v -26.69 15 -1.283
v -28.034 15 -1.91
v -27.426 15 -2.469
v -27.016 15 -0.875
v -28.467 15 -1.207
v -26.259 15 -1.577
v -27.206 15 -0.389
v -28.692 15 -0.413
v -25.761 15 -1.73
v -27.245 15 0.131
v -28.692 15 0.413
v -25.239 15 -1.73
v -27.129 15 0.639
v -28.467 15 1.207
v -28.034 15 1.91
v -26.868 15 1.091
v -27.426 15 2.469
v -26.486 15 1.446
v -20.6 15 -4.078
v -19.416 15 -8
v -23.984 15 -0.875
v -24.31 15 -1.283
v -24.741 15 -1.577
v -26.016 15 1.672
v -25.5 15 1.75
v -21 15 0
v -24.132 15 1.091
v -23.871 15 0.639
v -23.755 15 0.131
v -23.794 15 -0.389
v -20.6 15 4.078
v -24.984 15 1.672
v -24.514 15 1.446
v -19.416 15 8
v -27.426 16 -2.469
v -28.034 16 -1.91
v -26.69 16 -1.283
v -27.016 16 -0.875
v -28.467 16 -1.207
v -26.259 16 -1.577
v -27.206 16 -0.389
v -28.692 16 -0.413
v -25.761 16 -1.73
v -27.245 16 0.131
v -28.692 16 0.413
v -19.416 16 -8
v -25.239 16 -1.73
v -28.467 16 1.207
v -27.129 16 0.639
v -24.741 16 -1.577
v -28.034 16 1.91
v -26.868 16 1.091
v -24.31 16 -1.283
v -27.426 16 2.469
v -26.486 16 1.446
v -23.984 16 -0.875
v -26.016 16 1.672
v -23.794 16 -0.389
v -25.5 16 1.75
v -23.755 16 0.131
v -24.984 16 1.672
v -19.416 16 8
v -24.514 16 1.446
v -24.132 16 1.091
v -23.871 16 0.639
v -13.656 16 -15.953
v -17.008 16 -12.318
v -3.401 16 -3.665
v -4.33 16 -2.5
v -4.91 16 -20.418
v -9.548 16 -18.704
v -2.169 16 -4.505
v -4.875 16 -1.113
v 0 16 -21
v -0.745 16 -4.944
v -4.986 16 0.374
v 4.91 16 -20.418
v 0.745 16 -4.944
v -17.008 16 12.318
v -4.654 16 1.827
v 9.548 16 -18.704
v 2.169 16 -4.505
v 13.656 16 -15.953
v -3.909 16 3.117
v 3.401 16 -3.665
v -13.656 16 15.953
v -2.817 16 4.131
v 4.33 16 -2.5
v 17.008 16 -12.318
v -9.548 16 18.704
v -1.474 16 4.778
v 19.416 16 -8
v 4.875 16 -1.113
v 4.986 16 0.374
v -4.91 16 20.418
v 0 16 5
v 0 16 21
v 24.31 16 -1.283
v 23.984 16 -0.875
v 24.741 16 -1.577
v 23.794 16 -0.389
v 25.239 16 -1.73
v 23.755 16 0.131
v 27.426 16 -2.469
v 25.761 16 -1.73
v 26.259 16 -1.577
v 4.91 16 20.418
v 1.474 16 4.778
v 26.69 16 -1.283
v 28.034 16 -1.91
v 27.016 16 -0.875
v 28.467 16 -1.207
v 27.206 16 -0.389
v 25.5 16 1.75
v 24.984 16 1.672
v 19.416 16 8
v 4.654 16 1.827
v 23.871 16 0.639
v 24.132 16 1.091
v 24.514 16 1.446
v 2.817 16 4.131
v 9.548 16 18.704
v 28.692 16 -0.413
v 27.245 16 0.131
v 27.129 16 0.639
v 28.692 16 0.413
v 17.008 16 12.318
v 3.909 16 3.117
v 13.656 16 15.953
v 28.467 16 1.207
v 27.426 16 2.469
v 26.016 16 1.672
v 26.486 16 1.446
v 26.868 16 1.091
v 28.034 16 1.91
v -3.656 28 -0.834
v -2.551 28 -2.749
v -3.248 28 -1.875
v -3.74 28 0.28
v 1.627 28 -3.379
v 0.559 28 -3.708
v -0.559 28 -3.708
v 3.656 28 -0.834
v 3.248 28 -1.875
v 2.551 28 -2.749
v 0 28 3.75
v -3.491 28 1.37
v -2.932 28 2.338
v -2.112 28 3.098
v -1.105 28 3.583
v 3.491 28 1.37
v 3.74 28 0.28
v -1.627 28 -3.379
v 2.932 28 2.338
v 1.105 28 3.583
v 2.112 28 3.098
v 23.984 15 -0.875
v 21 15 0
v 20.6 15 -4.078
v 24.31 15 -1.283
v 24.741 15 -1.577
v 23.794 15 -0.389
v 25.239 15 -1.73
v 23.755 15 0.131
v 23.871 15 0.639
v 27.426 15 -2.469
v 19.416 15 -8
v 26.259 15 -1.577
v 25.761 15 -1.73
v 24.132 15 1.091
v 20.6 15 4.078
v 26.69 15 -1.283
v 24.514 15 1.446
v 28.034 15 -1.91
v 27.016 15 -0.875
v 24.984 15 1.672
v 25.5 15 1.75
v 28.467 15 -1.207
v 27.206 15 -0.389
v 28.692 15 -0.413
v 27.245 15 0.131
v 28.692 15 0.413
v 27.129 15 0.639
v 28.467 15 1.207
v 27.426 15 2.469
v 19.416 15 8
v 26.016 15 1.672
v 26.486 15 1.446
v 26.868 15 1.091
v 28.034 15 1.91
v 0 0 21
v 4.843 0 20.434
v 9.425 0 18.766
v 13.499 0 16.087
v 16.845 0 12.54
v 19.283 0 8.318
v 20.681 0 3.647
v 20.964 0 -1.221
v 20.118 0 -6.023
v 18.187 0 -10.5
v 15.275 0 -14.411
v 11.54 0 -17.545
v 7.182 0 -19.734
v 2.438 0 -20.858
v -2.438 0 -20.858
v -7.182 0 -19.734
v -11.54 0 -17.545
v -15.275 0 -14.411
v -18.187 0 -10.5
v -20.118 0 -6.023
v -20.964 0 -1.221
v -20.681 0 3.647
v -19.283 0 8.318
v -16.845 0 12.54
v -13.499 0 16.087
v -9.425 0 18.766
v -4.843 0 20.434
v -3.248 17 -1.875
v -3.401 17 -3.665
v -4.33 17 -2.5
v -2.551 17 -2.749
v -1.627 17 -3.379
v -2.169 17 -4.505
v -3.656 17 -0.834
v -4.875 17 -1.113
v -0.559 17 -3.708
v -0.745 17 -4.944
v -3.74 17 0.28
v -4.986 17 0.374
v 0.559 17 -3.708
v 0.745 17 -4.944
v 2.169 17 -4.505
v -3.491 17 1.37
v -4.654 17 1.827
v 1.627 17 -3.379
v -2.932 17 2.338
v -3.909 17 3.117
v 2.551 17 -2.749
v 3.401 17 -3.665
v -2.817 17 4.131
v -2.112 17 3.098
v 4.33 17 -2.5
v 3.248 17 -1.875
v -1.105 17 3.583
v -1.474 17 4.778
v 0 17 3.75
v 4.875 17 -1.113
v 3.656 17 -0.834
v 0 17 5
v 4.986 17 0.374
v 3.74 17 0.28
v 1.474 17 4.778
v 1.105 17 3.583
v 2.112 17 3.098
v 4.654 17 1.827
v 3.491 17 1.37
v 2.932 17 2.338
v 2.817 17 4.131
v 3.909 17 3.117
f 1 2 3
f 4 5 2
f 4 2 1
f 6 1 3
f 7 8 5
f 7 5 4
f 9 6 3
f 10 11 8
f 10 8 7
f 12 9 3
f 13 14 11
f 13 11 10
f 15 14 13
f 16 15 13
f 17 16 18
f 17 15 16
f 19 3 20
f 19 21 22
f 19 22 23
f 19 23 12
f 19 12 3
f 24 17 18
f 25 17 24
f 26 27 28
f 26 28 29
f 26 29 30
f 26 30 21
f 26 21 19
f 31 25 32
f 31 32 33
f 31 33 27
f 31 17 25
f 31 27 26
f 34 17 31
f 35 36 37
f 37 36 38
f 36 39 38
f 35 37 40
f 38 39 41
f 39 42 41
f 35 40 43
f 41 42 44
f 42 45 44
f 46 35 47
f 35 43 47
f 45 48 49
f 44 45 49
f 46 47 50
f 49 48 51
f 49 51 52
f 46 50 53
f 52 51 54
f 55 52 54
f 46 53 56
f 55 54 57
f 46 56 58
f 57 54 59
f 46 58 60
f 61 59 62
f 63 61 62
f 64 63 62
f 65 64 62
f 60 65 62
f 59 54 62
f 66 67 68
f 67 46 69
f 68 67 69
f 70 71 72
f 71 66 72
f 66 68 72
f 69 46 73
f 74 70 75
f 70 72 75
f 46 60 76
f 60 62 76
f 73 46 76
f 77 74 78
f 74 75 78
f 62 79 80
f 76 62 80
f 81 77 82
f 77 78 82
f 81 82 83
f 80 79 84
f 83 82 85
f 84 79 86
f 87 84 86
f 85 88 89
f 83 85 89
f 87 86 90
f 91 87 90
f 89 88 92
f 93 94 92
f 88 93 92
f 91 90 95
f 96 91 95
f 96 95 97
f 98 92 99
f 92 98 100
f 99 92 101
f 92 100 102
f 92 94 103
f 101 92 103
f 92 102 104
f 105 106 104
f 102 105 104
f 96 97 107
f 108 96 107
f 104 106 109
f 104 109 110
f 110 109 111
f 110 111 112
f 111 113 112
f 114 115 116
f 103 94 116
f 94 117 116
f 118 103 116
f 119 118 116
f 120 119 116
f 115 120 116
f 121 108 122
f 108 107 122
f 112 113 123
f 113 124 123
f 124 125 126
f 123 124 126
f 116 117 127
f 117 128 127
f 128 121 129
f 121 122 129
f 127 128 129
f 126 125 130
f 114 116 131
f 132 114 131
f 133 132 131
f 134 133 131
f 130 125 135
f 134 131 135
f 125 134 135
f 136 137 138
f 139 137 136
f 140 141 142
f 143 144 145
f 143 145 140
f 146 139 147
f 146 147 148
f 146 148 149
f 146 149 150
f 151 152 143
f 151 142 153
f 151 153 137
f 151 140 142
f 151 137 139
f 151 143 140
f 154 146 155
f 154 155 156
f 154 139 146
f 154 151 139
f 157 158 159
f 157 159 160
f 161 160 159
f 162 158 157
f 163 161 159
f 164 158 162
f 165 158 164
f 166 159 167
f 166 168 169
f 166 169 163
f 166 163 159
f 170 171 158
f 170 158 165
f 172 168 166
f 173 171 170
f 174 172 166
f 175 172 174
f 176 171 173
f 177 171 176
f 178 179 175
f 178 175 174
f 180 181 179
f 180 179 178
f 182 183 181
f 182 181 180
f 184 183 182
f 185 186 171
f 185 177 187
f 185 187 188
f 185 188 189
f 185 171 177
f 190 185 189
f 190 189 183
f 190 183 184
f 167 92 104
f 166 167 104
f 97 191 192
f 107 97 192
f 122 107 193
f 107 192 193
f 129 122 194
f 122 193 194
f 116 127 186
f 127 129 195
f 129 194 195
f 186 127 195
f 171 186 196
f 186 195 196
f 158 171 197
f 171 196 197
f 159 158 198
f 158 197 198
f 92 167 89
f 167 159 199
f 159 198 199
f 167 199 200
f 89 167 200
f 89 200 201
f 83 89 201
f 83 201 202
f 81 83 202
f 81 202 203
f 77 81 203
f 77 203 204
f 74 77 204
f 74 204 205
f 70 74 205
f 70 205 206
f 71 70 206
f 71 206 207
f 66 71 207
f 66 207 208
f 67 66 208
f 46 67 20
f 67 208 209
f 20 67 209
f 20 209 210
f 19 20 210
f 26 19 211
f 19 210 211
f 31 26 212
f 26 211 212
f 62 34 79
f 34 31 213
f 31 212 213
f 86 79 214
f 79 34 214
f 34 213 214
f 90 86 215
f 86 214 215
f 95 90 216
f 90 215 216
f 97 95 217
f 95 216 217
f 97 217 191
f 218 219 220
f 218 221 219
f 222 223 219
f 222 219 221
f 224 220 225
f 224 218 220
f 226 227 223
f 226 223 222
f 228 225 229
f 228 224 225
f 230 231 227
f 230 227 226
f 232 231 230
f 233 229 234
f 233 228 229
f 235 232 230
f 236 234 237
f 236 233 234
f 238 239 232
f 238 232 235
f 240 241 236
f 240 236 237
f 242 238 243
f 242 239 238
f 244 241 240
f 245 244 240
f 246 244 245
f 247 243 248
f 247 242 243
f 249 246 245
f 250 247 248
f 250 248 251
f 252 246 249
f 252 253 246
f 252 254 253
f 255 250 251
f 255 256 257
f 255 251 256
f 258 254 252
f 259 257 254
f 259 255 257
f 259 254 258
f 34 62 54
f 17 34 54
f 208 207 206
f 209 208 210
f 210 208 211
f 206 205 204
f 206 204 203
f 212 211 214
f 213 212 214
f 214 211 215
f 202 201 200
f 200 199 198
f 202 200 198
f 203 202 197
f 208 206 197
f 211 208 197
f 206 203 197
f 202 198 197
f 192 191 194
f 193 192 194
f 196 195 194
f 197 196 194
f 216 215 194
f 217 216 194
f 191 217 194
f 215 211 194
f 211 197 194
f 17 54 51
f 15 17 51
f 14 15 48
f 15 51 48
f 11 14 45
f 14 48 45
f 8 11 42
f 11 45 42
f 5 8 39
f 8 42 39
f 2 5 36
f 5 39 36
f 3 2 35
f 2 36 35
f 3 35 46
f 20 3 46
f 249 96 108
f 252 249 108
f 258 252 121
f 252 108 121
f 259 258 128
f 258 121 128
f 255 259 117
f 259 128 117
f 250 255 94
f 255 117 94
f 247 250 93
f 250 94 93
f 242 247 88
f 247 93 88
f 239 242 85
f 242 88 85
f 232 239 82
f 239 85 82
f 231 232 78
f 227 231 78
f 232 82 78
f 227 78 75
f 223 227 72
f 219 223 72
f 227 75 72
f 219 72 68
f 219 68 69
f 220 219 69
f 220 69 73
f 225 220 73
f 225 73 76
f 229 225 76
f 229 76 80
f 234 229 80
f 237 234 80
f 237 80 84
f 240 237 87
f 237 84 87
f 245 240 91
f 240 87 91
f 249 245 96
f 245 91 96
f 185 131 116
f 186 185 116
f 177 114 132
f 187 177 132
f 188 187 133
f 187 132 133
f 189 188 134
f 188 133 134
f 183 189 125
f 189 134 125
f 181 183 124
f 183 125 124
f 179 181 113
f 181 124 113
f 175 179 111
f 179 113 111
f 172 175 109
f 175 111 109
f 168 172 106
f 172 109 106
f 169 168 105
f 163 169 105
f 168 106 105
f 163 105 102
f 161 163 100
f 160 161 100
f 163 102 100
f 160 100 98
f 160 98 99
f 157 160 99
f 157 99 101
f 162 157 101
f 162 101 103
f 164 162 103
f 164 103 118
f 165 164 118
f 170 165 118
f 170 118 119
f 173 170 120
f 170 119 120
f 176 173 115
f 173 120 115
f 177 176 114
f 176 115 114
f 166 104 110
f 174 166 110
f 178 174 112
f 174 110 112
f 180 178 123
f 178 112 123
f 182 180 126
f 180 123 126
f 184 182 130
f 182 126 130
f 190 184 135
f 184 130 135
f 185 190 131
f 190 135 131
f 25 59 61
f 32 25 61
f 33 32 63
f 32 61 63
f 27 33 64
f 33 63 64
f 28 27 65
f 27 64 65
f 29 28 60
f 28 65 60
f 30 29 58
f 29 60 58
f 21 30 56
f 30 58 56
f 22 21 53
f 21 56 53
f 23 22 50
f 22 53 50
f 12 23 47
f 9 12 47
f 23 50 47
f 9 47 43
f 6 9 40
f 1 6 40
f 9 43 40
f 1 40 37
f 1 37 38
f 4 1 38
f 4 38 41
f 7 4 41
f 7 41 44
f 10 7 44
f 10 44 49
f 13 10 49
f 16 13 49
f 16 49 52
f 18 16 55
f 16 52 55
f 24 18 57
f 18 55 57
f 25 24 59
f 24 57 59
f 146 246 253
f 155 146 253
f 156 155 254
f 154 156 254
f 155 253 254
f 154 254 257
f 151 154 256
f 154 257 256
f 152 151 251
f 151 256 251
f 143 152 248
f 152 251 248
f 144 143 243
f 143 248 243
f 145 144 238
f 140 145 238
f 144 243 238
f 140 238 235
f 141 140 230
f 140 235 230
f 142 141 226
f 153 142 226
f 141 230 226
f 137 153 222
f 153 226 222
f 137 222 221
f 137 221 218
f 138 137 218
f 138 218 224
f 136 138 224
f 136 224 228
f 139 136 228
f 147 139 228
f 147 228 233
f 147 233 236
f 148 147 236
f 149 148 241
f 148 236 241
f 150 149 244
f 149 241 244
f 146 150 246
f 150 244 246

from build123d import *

# Parameters (mm, degrees)
SKETCH1_R      = 21
EXTRUDE1_DEPTH = 16
SKETCH5_R      = 1.75
EXTRUDE2_DEPTH = 1
SKETCH6_R      = 5
EXTRUDE3_DEPTH = 1
SKETCH7_R      = 3.75
EXTRUDE4_DEPTH = 11


with BuildPart() as part:
    # Sketch1 → Extrude1 (new body)
    with BuildSketch(Plane(origin=(0, 0, 0), x_dir=(1, 0, 0), z_dir=(0, 1, 0))):
        with Locations(Location((0, 0, 0), (0, 0, 270))):
            Circle(SKETCH1_R)
    extrude(amount=EXTRUDE1_DEPTH)

    # Sketch5 → Extrude2 (add)
    with BuildSketch(Plane(origin=(0, 16, 0), x_dir=(-1, 0, 0), z_dir=(0, 1, 0))):
        with BuildLine():
            Line((19.416487839, 8), (27.425754866, 2.468505292))
            ThreePointArc((27.425754866, 2.468505292), (28.720914222, 0), (27.425754866, -2.468505292))
            Line((27.425754866, -2.468505292), (19.416487839, -8))
            Line((19.416487839, -8), (-19.416487839, -8))
            Line((-19.416487839, -8), (-27.425754866, -2.468505292))
            ThreePointArc((-27.425754866, -2.468505292), (-28.720914222, 0), (-27.425754866, 2.468505292))
            Line((-27.425754866, 2.468505292), (-19.416487839, 8))
            Line((-19.416487839, 8), (19.416487839, 8))
        make_face()
        with Locations(Location((25.5, 0, 0), (0, 0, 90))):
            Circle(SKETCH5_R, mode=Mode.SUBTRACT)
        with Locations(Location((-25.5, 0, 0), (0, 0, 90))):
            Circle(SKETCH5_R, mode=Mode.SUBTRACT)
    extrude(amount=-EXTRUDE2_DEPTH)

    # Sketch6 → Extrude3 (add)
    with BuildSketch(Plane(origin=(0, 16, 0), x_dir=(-1, 0, 0), z_dir=(0, 1, 0))):
        with Locations(Location((0, 0, 0), (0, 0, 90))):
            Circle(SKETCH6_R)
    extrude(amount=EXTRUDE3_DEPTH)

    # Sketch7 → Extrude4 (add)
    with BuildSketch(Plane(origin=(0, 17, 0), x_dir=(-1, 0, 0), z_dir=(0, 1, 0))):
        with Locations(Location((0, 0, 0), (0, 0, 90))):
            Circle(SKETCH7_R)
    extrude(amount=EXTRUDE4_DEPTH)


solid = part.part
